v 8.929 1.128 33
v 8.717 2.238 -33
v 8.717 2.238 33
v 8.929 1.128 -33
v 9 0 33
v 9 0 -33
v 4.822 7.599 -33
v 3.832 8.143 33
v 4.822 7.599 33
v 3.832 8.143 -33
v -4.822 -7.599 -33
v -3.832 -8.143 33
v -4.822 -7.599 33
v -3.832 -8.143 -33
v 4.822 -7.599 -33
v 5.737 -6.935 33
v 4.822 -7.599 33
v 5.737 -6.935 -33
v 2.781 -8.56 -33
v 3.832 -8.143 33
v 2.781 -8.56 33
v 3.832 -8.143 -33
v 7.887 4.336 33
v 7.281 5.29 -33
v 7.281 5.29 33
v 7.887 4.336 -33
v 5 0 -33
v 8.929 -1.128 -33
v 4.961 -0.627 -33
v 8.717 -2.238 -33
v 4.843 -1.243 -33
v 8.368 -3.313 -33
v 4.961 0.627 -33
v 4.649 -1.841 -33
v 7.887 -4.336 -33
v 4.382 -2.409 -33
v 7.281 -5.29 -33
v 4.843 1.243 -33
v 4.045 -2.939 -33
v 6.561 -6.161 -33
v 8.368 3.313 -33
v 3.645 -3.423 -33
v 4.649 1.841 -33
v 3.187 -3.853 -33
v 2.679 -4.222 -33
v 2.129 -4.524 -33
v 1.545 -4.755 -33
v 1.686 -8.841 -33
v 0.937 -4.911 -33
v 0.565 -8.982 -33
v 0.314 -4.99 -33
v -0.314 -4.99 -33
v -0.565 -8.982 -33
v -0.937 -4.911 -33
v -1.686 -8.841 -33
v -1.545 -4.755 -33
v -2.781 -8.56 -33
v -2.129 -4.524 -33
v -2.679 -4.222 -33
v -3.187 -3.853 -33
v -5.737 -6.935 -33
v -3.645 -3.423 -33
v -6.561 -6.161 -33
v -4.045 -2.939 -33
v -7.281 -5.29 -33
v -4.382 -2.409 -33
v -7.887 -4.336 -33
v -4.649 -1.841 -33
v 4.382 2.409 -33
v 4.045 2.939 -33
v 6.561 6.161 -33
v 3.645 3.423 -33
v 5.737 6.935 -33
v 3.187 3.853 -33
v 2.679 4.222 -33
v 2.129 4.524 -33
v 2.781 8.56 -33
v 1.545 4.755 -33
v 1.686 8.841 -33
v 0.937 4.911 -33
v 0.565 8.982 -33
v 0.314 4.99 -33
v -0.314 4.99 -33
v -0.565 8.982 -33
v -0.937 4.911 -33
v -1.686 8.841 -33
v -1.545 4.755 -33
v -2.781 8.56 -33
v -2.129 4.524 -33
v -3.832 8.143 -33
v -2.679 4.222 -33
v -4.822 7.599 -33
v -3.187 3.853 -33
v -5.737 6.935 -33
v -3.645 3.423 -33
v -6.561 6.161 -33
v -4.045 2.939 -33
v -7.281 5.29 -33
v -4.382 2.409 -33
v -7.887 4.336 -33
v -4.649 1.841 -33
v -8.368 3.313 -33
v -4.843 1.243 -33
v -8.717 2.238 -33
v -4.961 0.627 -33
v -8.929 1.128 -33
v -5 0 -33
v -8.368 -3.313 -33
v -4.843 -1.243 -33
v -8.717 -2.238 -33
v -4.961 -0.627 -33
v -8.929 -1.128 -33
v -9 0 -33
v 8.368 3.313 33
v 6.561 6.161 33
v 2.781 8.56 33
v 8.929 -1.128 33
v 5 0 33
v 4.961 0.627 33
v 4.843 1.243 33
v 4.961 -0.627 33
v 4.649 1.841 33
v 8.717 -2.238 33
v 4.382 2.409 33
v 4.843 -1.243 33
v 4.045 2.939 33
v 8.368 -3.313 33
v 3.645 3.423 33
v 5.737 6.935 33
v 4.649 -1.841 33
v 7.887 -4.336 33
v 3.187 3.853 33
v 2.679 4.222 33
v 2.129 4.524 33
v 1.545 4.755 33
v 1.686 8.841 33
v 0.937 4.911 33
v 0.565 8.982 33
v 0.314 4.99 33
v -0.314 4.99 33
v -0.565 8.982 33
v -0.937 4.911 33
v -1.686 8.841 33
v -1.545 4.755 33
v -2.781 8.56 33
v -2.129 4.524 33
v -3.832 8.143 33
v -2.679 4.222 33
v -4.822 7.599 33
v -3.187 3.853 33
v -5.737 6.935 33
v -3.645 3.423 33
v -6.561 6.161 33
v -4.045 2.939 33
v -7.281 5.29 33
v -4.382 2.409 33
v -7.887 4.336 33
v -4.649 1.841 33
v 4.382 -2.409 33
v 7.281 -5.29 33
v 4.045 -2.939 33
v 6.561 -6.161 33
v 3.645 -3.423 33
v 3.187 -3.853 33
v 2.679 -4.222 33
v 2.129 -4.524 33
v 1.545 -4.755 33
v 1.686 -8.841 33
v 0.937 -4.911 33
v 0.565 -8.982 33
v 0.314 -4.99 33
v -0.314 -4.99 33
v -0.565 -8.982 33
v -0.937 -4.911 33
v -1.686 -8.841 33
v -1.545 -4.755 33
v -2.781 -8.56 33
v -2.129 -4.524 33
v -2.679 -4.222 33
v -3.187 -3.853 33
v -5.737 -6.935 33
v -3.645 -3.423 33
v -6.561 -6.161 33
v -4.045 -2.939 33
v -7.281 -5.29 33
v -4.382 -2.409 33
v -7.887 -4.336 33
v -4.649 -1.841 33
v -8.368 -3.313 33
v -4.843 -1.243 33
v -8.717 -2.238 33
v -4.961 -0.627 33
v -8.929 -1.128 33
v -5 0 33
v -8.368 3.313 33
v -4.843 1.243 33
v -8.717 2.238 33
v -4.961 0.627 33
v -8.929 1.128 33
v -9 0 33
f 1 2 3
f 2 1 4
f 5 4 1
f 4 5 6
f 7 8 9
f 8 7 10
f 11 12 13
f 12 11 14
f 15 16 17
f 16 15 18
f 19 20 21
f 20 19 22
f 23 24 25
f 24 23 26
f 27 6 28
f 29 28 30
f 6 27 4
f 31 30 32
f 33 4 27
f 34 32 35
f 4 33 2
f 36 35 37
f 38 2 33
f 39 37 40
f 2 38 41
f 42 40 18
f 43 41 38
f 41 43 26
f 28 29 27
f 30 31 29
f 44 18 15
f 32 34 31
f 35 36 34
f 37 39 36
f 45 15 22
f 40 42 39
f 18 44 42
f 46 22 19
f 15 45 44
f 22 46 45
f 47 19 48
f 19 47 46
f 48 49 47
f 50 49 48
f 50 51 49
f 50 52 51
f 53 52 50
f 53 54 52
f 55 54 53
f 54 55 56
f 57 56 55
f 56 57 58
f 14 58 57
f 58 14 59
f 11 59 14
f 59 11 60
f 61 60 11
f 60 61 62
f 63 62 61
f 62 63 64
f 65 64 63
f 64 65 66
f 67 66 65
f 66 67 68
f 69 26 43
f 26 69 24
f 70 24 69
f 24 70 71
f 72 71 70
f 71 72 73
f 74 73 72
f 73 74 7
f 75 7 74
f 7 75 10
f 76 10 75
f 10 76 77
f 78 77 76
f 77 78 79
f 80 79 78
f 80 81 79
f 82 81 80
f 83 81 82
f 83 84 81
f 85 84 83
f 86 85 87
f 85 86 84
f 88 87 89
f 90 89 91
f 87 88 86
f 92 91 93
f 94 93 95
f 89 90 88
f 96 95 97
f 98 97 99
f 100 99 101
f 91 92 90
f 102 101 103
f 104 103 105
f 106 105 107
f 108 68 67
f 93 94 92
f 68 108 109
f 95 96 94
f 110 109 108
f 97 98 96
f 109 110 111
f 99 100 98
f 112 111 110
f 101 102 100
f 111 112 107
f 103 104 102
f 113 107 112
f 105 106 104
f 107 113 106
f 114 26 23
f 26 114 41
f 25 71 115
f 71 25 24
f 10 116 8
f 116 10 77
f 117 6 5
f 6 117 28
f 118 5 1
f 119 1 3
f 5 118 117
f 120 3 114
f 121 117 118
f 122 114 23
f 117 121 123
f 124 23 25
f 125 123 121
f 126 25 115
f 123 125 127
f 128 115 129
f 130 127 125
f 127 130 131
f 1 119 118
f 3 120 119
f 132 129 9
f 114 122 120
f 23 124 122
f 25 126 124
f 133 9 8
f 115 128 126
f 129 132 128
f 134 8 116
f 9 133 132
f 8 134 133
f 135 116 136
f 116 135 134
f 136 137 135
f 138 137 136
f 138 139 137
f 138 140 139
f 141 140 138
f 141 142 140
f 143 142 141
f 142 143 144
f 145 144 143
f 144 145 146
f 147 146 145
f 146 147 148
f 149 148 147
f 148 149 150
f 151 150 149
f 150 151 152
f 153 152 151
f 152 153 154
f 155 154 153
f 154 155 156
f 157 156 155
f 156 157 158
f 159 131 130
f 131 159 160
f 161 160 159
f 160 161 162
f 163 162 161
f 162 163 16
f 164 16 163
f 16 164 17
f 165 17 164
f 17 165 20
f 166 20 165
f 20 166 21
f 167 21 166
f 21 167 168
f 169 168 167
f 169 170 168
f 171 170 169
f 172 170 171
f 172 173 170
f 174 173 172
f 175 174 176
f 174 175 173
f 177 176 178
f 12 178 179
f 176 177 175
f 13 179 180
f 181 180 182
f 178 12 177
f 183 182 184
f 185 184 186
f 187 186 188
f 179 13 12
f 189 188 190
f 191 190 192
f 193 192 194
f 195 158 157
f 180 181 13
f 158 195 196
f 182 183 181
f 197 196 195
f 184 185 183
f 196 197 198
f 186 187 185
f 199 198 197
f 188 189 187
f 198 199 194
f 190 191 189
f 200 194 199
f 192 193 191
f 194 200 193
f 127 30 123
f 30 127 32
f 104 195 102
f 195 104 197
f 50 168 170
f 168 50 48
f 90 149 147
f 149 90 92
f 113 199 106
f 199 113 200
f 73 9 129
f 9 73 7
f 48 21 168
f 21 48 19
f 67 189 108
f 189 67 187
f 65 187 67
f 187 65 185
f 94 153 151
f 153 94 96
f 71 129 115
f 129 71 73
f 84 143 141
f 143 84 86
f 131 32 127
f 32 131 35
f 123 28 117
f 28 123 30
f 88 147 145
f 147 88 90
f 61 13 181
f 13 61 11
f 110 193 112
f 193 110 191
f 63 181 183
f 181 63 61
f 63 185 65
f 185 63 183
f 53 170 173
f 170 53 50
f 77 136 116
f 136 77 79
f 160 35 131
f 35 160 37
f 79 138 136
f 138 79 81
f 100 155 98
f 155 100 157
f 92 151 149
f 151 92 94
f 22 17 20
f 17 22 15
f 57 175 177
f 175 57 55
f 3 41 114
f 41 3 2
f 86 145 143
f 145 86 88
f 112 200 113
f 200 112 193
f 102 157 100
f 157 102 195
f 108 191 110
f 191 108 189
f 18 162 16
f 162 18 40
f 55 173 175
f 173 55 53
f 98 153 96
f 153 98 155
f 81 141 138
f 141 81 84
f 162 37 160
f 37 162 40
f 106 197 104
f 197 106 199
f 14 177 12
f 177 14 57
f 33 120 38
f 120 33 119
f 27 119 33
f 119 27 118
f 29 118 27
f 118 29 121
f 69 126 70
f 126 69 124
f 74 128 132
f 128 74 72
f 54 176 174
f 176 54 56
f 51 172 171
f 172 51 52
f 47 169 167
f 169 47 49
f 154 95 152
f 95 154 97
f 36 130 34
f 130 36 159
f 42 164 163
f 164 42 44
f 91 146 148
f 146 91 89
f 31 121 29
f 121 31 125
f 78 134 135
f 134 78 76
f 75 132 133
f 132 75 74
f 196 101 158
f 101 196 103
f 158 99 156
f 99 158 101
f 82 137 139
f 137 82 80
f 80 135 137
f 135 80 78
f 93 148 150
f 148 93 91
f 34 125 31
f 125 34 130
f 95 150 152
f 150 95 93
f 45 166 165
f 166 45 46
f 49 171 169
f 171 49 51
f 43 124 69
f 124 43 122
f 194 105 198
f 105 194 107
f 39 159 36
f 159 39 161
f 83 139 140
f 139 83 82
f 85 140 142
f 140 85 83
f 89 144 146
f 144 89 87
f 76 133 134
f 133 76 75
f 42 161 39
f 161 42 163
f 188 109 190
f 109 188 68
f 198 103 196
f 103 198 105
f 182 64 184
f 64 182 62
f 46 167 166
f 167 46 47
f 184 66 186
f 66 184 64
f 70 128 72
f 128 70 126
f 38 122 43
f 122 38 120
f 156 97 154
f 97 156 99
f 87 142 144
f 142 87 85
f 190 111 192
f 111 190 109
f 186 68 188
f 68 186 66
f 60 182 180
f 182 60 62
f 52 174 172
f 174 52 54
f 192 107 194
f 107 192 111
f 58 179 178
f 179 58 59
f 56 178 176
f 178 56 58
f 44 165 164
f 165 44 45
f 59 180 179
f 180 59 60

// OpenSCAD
$fn = 50;


difference() {
	union() {
		translate(v = [0, 0, -33.0000000000]) {
			cylinder(h = 66, r = 9.0000000000);
		}
	}
	union() {
		translate(v = [0, 0, -100.0000000000]) {
			cylinder(h = 200, r = 5.0000000000);
		}
	}
}
